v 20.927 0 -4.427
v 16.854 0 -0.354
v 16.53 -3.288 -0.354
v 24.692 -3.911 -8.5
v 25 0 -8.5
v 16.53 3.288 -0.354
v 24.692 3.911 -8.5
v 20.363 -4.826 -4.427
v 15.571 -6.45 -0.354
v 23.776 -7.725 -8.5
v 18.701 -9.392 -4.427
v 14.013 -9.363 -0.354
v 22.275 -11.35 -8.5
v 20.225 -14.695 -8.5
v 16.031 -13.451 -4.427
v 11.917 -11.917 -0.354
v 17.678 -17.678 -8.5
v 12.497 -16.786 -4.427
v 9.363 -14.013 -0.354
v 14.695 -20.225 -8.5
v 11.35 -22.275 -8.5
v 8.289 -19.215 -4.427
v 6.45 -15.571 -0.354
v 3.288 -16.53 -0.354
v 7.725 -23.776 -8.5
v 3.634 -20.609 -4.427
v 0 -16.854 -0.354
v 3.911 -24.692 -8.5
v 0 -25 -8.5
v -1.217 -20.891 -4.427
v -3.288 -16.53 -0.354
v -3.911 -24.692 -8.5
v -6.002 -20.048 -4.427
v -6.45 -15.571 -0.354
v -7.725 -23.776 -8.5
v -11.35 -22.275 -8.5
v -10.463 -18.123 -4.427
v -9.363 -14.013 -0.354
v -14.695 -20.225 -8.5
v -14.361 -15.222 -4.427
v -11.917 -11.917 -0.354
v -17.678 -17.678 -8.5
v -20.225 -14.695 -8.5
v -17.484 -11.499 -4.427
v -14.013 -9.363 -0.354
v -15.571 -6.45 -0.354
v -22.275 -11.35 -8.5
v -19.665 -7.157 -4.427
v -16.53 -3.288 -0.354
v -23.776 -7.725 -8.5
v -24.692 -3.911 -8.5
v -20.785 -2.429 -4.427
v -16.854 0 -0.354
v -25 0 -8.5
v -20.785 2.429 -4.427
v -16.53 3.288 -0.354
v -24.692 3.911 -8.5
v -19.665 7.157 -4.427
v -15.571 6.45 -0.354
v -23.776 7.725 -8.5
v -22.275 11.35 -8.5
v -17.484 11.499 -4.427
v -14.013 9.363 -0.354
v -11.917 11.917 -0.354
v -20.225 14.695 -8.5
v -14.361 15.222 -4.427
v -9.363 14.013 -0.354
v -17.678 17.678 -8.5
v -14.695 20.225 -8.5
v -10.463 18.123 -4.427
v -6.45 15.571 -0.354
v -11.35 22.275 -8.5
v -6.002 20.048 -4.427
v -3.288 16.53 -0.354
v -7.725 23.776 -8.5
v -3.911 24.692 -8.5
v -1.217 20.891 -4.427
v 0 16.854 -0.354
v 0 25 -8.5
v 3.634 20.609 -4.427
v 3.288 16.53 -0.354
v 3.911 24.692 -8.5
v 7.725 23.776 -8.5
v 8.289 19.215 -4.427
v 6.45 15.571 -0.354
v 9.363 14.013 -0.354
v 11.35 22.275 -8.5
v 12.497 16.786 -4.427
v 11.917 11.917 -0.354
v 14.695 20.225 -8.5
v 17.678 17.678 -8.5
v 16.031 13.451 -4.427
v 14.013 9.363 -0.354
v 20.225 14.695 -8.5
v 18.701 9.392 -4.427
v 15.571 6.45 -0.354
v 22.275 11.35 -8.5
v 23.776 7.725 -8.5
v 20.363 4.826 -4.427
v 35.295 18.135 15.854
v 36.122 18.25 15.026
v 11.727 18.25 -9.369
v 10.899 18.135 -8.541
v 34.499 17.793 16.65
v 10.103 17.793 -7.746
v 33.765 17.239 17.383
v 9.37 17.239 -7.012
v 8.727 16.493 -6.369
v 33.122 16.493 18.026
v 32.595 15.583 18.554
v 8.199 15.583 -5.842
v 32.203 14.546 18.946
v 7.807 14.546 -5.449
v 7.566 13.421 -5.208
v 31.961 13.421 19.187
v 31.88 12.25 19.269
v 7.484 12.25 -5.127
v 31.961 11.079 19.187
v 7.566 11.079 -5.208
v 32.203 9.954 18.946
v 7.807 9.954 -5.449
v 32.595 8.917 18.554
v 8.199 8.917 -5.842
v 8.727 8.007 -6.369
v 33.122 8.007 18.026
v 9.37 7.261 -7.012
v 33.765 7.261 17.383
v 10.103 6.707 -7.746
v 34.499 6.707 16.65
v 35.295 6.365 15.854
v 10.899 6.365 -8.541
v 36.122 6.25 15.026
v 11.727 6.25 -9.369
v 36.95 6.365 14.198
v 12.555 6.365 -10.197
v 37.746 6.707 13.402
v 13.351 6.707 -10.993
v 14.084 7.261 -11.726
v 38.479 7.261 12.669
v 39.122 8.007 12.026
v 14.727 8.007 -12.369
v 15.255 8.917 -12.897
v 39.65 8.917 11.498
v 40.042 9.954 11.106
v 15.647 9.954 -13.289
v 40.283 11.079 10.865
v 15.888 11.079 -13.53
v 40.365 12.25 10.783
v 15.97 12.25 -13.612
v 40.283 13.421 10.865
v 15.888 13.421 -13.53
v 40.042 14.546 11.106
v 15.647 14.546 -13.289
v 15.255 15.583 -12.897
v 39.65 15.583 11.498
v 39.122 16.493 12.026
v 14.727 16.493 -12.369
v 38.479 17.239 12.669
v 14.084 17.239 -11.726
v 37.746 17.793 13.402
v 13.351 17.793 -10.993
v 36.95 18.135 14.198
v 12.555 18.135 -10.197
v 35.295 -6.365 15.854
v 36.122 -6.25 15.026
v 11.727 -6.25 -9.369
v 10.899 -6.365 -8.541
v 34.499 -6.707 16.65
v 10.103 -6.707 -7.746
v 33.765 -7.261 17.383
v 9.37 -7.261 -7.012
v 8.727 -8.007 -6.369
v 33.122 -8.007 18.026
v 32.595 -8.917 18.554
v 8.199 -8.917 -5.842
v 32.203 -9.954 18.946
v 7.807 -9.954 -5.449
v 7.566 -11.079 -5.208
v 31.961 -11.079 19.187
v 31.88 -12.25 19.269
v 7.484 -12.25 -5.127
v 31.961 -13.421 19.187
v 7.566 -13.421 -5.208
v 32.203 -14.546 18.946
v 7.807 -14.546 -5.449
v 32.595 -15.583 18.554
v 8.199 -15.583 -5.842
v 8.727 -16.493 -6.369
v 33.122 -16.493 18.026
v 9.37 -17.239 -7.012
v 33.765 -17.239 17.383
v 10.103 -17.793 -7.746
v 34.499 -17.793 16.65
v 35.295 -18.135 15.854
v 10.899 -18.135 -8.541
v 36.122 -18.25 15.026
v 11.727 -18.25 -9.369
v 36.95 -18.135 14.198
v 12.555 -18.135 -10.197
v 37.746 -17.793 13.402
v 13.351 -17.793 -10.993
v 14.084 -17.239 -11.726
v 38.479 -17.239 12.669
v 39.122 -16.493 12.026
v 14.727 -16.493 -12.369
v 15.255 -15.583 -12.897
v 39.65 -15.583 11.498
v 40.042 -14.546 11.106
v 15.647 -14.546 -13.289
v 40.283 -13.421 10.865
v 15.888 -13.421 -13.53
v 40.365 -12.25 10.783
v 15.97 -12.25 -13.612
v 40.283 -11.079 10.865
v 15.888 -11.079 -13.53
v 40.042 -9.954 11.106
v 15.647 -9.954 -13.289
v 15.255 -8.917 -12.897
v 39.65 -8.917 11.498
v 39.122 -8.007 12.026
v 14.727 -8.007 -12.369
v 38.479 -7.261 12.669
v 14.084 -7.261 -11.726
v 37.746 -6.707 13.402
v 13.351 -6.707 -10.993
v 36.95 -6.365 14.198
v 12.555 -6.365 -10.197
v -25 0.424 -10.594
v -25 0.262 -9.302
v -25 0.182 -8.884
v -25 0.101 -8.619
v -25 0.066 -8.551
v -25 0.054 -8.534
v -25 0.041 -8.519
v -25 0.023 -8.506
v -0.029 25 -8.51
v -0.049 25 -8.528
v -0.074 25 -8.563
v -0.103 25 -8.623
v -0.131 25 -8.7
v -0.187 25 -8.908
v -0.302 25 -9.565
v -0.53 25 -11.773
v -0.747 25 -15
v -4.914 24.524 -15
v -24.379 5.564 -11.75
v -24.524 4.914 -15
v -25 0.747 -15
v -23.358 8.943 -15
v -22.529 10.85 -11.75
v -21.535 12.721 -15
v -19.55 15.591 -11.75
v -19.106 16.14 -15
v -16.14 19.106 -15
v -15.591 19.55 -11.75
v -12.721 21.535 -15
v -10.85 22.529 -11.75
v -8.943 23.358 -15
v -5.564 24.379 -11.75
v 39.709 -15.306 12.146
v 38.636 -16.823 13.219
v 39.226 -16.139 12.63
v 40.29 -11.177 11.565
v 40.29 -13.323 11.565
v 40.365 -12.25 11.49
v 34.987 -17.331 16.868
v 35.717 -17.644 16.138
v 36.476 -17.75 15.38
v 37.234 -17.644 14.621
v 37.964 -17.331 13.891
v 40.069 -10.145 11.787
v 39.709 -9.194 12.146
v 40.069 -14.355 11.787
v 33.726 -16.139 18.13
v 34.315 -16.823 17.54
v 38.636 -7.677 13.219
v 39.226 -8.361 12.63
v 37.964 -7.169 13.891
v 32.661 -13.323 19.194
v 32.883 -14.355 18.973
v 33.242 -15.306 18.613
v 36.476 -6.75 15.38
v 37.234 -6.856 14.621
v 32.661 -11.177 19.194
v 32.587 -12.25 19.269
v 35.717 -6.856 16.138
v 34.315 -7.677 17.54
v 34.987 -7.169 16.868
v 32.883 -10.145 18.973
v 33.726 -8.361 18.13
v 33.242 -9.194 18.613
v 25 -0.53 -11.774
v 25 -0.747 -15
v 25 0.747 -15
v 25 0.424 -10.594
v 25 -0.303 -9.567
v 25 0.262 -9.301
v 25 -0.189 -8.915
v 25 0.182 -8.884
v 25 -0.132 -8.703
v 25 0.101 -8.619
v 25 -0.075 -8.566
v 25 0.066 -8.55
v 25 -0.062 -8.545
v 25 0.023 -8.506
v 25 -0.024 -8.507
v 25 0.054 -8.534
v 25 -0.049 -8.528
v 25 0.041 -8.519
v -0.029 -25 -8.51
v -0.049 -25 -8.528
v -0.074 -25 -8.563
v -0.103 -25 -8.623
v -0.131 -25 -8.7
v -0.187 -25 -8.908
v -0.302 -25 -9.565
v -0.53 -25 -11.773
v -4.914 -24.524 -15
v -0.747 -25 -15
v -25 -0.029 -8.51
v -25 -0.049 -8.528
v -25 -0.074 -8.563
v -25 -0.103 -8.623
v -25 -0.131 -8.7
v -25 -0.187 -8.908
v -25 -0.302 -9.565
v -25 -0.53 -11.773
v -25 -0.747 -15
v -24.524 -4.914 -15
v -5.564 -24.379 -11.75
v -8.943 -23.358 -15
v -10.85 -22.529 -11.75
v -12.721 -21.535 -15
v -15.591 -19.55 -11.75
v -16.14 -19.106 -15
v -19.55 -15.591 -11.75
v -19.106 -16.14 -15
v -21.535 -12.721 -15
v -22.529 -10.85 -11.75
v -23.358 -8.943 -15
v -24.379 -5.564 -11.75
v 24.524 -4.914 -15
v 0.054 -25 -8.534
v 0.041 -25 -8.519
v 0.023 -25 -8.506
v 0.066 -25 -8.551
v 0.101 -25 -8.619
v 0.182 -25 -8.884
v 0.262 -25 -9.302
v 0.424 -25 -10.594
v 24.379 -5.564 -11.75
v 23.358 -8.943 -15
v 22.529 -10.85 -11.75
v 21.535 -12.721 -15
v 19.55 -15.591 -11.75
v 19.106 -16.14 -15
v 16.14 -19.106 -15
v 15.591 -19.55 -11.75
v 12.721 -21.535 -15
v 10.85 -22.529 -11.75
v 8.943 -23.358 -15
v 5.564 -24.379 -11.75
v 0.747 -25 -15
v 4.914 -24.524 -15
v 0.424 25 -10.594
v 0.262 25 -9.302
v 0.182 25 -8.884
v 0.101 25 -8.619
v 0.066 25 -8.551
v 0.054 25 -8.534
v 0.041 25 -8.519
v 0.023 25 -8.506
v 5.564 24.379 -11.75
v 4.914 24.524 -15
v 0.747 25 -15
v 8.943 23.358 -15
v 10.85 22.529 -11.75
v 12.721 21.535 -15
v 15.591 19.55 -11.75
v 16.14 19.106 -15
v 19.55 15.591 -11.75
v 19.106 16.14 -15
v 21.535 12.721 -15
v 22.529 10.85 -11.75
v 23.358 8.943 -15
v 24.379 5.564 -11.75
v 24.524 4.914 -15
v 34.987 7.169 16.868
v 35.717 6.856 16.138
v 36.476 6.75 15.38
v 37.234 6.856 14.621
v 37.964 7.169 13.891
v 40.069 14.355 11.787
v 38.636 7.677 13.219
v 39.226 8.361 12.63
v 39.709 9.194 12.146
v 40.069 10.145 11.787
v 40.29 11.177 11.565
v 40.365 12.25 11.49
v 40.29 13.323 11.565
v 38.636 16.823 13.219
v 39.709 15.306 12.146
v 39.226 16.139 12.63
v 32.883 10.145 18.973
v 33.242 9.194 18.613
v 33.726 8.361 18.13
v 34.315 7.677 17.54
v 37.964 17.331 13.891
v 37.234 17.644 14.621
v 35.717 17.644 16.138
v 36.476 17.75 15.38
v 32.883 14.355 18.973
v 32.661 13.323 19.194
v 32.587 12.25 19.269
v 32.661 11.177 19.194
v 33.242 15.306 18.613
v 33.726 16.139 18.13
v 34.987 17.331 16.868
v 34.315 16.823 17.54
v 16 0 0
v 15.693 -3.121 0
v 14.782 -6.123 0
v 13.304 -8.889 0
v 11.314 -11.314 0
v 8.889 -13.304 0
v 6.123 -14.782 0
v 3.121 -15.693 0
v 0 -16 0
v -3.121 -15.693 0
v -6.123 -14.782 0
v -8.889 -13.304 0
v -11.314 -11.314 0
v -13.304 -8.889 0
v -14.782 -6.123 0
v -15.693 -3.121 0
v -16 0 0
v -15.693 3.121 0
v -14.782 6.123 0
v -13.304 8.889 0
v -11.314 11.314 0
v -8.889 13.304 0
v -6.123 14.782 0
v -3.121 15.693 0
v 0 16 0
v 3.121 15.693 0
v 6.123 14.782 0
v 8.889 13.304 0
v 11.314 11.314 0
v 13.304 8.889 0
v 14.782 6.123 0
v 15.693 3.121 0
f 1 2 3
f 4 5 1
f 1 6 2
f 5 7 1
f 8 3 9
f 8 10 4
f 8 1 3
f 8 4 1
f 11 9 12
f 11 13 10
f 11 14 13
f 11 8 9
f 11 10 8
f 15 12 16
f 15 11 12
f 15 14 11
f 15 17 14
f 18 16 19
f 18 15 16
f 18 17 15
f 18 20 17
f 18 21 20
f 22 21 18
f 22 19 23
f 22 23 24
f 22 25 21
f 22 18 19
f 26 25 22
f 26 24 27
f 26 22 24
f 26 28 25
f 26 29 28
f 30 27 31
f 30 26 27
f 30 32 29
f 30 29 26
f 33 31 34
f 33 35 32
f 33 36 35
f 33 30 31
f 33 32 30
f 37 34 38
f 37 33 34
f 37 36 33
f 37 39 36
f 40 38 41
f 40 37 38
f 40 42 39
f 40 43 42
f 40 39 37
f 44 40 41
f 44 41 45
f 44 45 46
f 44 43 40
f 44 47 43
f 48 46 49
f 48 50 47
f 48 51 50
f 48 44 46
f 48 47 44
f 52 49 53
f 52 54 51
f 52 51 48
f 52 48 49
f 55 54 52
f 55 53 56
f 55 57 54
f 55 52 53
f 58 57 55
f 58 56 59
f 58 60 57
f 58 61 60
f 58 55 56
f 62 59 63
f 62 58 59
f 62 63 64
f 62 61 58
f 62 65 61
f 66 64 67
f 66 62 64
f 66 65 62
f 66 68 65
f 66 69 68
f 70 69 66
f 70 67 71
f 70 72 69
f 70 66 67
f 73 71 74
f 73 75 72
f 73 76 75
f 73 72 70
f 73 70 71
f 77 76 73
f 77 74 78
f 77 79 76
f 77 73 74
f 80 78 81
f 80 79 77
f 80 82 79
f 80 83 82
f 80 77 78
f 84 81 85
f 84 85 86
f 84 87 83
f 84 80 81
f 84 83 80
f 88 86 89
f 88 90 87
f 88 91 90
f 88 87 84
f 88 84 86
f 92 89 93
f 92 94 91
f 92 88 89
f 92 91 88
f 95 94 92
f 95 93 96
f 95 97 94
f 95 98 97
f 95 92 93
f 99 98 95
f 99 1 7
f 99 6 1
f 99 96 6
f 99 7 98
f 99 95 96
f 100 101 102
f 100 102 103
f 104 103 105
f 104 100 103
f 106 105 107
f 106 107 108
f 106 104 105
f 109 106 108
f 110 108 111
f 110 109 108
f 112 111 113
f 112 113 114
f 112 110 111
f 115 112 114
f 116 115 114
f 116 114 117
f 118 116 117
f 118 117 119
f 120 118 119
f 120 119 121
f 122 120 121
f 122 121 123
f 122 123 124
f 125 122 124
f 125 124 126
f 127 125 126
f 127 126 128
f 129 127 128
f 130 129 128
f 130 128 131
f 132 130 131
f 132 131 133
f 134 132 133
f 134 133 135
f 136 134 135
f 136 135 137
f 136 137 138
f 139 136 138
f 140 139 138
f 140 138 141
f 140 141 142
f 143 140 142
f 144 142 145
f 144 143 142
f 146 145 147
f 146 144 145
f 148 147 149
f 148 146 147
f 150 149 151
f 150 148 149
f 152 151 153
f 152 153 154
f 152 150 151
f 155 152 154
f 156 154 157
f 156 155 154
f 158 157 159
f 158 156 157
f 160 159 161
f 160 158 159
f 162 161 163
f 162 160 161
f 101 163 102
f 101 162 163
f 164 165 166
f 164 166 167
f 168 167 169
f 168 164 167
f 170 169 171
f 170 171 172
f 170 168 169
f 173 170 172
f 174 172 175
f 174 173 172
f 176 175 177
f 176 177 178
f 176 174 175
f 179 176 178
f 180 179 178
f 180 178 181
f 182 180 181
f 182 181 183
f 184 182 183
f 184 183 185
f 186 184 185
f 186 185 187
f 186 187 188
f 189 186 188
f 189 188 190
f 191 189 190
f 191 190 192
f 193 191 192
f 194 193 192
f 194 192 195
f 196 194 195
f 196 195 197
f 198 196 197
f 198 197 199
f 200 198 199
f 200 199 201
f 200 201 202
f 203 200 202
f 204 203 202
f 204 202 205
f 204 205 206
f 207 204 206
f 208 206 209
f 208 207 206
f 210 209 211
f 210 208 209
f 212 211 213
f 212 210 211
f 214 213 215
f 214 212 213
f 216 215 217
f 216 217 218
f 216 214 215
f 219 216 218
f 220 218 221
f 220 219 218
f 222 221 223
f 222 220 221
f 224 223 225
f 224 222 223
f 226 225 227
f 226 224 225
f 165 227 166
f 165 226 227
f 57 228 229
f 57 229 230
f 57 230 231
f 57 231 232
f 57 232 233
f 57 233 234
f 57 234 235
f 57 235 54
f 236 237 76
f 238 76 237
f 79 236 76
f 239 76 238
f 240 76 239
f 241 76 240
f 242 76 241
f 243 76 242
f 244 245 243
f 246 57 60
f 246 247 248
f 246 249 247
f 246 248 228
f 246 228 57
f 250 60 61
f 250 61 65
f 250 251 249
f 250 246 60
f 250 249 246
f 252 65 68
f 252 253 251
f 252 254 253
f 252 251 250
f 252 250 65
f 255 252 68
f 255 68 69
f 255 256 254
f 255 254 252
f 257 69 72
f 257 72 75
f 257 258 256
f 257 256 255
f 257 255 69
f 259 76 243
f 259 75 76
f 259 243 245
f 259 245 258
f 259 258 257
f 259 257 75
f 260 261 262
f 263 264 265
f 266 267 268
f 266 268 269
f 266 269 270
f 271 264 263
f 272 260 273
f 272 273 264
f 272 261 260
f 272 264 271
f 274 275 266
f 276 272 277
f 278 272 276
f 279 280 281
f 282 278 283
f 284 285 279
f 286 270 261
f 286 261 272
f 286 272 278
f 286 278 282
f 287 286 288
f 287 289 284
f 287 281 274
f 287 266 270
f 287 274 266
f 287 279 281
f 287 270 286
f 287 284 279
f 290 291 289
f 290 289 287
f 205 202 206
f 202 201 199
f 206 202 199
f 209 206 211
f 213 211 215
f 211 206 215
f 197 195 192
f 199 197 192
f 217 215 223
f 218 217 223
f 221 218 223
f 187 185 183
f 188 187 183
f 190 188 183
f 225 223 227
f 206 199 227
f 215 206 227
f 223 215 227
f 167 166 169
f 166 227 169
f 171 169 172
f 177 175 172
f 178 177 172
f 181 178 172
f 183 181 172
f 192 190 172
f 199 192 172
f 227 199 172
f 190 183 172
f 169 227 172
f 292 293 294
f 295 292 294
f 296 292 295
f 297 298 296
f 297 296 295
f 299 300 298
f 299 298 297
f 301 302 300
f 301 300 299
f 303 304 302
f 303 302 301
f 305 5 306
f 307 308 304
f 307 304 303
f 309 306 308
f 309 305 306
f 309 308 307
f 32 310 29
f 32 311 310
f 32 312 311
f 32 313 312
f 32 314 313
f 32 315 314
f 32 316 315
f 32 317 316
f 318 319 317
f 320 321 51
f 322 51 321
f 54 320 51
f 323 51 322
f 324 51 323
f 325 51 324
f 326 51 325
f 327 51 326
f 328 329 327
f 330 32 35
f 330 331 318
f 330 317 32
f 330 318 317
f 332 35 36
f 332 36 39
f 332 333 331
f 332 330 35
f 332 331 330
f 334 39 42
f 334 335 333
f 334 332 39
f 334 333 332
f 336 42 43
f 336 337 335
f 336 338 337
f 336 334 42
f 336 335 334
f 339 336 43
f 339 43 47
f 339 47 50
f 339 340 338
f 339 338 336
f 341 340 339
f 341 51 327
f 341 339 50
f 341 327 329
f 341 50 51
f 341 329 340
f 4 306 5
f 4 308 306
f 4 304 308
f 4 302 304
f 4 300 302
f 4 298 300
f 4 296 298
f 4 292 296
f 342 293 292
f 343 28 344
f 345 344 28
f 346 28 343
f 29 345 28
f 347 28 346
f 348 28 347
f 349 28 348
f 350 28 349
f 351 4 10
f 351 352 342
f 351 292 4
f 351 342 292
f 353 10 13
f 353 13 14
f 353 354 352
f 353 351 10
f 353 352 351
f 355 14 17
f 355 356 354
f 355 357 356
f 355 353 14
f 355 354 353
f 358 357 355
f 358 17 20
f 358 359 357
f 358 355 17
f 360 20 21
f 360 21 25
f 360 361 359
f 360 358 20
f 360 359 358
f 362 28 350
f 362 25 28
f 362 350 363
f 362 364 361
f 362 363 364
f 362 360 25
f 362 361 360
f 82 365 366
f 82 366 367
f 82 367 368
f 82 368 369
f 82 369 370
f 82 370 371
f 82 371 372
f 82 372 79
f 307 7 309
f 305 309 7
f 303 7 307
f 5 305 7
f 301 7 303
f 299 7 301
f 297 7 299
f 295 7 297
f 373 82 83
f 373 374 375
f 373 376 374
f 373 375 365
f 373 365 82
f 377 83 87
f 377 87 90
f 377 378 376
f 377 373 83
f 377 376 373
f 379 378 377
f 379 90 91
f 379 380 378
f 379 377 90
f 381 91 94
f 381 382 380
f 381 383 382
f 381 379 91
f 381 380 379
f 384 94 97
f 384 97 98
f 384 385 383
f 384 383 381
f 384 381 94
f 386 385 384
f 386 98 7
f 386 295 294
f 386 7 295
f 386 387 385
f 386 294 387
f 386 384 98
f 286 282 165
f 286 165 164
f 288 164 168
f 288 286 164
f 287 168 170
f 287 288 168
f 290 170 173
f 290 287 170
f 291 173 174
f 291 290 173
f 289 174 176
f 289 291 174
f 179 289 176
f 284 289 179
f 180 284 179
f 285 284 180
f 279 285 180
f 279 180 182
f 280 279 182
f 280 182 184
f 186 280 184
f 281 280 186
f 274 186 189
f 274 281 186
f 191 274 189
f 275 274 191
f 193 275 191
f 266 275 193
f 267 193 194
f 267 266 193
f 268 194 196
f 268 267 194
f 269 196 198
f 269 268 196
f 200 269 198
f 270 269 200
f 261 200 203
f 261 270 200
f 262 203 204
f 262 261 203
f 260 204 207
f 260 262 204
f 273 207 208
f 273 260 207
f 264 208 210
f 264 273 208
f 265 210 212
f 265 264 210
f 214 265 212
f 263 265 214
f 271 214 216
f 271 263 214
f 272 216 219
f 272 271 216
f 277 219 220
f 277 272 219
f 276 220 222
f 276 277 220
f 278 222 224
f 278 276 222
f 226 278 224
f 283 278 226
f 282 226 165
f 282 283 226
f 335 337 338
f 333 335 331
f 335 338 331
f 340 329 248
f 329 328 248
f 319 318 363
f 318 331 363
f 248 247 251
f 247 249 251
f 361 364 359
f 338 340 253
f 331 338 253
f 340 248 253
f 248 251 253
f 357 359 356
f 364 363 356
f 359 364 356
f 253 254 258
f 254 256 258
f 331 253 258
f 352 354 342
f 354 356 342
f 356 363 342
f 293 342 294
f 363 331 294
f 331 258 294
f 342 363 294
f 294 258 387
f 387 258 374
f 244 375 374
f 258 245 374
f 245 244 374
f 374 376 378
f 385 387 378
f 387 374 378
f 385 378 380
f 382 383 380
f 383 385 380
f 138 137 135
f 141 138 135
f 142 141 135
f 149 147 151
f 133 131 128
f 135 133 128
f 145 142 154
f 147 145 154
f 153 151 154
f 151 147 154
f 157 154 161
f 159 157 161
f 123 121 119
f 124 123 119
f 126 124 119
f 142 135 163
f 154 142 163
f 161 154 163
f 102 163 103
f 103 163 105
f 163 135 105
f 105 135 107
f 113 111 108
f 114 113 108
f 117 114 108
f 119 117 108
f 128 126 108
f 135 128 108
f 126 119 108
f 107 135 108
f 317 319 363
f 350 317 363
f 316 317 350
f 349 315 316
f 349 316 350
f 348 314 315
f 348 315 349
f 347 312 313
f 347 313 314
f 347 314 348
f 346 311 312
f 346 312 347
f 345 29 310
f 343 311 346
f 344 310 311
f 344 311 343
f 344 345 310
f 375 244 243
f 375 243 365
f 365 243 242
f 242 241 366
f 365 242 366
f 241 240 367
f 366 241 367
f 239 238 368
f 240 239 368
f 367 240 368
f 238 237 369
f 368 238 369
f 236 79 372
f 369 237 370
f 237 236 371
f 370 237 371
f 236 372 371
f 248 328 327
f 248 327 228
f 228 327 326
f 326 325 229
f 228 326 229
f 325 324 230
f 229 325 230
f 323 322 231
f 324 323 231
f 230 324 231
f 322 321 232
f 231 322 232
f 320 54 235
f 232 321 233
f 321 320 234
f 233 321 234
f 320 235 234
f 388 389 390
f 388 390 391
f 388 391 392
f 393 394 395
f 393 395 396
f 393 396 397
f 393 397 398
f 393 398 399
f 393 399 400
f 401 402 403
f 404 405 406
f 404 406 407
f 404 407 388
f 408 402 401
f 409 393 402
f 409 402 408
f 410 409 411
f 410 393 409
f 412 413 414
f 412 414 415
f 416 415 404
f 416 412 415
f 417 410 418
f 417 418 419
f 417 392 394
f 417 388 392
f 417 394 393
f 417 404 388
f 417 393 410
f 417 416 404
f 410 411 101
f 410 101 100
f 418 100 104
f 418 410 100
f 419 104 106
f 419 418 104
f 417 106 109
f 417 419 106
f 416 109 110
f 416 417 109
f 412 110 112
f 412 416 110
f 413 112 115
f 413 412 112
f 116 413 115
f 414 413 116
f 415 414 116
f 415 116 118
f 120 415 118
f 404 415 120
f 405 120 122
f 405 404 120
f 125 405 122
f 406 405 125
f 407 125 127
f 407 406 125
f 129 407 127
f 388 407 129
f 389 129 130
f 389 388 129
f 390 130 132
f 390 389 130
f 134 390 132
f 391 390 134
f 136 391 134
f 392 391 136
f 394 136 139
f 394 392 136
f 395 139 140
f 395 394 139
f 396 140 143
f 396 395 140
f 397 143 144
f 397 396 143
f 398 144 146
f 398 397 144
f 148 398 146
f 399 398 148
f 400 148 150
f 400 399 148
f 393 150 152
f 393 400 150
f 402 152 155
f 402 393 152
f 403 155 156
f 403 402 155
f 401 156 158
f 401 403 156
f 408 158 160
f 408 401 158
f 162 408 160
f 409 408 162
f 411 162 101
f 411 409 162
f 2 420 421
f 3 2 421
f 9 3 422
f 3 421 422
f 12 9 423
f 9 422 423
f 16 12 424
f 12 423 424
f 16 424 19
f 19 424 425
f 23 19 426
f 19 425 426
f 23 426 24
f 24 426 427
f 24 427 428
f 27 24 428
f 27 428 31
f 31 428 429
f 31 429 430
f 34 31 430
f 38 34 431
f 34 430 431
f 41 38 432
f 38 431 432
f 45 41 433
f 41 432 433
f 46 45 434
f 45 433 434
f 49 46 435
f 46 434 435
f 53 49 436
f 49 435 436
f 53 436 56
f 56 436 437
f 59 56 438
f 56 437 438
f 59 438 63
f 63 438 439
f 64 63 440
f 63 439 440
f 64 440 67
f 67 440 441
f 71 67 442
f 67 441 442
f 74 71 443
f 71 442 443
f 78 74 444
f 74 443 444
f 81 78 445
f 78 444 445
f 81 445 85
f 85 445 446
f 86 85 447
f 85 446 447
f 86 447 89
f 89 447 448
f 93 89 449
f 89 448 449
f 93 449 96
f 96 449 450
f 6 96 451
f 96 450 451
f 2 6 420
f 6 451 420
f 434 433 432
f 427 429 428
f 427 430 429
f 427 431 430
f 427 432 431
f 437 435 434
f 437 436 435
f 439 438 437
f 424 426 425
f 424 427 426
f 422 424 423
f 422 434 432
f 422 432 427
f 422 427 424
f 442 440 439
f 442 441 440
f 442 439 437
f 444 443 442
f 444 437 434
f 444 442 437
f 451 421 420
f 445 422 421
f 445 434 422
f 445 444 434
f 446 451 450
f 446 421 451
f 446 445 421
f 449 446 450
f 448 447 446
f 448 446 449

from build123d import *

# Parameters (mm, degrees)
F0_W          = 50
F0_H          = 50
F1_DEPTH      = 15
F2_SIZE       = 8.5
F3_R          = 6
F6_DEPTH      = 25
F6_DEPTH_BACK = 10
F7_SIZE       = 0.5
F7_2_SIZE     = 0.5
F7_3_SIZE     = 0.5


# Not quite as in the source:
# - a feature names something its author has since deleted; it is built from what else it names


with BuildPart() as f1:
    # F0 (on Top) → F1 (new body)
    with BuildSketch(Plane.XY):
        Rectangle(F0_W, F0_H)
    extrude(amount=-F1_DEPTH)

    # F2
    f2_edges = [f1.edges().sort_by_distance(p)[0] for p in [
        (25, 0, 0),
    ]]
    chamfer(f2_edges, length=F2_SIZE)

    # F4 (on Front) → F5 (revolve, cut)
    with BuildSketch(Plane.XZ):
        Polygon((16.5, 0), (25, -8.5), (25.0111613423, -15), (57.6415769756, -15), (57.6415769756, 0), align=None)
    revolve(axis=Axis((0, 0, -4.25), (0, 0, -1)), mode=Mode.SUBTRACT)

    # F7#3
    f7_3_edges = [f1.edges().sort_by_distance(p)[0] for p in [
        (-16.5, 0, 0),
    ]]
    chamfer(f7_3_edges, length=F7_3_SIZE)


with BuildPart() as f6:
    # F3 (on face) → F6 (new body, two sides)
    with BuildSketch(Plane(origin=(8.25, 0, 8.25), x_dir=(0, 1, 0), z_dir=(0.7071067812, 0, 0.7071067812))) as f6_sk:
        with Locations((-12.25, -14.9172618896)):
            Circle(F3_R)
    extrude(amount=F6_DEPTH)
    extrude(f6_sk.sketch, amount=-F6_DEPTH_BACK)

    # F7
    f7_edges = [f6.edges().sort_by_distance(p)[0] for p in [
        (36.475767, -18.25, 15.379572),
    ]]
    chamfer(f7_edges, length=F7_SIZE)


with BuildPart() as f6b:
    # F3 (on face) → F6, piece 2 (new body, two sides)
    with BuildSketch(Plane(origin=(8.25, 0, 8.25), x_dir=(0, 1, 0), z_dir=(0.7071067812, 0, 0.7071067812))) as f6_2_sk:
        with Locations((12.25, -14.9172618896)):
            Circle(F3_R)
    extrude(amount=F6_DEPTH)
    extrude(f6_2_sk.sketch, amount=-F6_DEPTH_BACK)

    # F7#2
    f7_2_edges = [f6b.edges().sort_by_distance(p)[0] for p in [
        (36.475767, 6.25, 15.379572),
    ]]
    chamfer(f7_2_edges, length=F7_2_SIZE)


solid = Compound([f1.part, f6.part, f6b.part])
